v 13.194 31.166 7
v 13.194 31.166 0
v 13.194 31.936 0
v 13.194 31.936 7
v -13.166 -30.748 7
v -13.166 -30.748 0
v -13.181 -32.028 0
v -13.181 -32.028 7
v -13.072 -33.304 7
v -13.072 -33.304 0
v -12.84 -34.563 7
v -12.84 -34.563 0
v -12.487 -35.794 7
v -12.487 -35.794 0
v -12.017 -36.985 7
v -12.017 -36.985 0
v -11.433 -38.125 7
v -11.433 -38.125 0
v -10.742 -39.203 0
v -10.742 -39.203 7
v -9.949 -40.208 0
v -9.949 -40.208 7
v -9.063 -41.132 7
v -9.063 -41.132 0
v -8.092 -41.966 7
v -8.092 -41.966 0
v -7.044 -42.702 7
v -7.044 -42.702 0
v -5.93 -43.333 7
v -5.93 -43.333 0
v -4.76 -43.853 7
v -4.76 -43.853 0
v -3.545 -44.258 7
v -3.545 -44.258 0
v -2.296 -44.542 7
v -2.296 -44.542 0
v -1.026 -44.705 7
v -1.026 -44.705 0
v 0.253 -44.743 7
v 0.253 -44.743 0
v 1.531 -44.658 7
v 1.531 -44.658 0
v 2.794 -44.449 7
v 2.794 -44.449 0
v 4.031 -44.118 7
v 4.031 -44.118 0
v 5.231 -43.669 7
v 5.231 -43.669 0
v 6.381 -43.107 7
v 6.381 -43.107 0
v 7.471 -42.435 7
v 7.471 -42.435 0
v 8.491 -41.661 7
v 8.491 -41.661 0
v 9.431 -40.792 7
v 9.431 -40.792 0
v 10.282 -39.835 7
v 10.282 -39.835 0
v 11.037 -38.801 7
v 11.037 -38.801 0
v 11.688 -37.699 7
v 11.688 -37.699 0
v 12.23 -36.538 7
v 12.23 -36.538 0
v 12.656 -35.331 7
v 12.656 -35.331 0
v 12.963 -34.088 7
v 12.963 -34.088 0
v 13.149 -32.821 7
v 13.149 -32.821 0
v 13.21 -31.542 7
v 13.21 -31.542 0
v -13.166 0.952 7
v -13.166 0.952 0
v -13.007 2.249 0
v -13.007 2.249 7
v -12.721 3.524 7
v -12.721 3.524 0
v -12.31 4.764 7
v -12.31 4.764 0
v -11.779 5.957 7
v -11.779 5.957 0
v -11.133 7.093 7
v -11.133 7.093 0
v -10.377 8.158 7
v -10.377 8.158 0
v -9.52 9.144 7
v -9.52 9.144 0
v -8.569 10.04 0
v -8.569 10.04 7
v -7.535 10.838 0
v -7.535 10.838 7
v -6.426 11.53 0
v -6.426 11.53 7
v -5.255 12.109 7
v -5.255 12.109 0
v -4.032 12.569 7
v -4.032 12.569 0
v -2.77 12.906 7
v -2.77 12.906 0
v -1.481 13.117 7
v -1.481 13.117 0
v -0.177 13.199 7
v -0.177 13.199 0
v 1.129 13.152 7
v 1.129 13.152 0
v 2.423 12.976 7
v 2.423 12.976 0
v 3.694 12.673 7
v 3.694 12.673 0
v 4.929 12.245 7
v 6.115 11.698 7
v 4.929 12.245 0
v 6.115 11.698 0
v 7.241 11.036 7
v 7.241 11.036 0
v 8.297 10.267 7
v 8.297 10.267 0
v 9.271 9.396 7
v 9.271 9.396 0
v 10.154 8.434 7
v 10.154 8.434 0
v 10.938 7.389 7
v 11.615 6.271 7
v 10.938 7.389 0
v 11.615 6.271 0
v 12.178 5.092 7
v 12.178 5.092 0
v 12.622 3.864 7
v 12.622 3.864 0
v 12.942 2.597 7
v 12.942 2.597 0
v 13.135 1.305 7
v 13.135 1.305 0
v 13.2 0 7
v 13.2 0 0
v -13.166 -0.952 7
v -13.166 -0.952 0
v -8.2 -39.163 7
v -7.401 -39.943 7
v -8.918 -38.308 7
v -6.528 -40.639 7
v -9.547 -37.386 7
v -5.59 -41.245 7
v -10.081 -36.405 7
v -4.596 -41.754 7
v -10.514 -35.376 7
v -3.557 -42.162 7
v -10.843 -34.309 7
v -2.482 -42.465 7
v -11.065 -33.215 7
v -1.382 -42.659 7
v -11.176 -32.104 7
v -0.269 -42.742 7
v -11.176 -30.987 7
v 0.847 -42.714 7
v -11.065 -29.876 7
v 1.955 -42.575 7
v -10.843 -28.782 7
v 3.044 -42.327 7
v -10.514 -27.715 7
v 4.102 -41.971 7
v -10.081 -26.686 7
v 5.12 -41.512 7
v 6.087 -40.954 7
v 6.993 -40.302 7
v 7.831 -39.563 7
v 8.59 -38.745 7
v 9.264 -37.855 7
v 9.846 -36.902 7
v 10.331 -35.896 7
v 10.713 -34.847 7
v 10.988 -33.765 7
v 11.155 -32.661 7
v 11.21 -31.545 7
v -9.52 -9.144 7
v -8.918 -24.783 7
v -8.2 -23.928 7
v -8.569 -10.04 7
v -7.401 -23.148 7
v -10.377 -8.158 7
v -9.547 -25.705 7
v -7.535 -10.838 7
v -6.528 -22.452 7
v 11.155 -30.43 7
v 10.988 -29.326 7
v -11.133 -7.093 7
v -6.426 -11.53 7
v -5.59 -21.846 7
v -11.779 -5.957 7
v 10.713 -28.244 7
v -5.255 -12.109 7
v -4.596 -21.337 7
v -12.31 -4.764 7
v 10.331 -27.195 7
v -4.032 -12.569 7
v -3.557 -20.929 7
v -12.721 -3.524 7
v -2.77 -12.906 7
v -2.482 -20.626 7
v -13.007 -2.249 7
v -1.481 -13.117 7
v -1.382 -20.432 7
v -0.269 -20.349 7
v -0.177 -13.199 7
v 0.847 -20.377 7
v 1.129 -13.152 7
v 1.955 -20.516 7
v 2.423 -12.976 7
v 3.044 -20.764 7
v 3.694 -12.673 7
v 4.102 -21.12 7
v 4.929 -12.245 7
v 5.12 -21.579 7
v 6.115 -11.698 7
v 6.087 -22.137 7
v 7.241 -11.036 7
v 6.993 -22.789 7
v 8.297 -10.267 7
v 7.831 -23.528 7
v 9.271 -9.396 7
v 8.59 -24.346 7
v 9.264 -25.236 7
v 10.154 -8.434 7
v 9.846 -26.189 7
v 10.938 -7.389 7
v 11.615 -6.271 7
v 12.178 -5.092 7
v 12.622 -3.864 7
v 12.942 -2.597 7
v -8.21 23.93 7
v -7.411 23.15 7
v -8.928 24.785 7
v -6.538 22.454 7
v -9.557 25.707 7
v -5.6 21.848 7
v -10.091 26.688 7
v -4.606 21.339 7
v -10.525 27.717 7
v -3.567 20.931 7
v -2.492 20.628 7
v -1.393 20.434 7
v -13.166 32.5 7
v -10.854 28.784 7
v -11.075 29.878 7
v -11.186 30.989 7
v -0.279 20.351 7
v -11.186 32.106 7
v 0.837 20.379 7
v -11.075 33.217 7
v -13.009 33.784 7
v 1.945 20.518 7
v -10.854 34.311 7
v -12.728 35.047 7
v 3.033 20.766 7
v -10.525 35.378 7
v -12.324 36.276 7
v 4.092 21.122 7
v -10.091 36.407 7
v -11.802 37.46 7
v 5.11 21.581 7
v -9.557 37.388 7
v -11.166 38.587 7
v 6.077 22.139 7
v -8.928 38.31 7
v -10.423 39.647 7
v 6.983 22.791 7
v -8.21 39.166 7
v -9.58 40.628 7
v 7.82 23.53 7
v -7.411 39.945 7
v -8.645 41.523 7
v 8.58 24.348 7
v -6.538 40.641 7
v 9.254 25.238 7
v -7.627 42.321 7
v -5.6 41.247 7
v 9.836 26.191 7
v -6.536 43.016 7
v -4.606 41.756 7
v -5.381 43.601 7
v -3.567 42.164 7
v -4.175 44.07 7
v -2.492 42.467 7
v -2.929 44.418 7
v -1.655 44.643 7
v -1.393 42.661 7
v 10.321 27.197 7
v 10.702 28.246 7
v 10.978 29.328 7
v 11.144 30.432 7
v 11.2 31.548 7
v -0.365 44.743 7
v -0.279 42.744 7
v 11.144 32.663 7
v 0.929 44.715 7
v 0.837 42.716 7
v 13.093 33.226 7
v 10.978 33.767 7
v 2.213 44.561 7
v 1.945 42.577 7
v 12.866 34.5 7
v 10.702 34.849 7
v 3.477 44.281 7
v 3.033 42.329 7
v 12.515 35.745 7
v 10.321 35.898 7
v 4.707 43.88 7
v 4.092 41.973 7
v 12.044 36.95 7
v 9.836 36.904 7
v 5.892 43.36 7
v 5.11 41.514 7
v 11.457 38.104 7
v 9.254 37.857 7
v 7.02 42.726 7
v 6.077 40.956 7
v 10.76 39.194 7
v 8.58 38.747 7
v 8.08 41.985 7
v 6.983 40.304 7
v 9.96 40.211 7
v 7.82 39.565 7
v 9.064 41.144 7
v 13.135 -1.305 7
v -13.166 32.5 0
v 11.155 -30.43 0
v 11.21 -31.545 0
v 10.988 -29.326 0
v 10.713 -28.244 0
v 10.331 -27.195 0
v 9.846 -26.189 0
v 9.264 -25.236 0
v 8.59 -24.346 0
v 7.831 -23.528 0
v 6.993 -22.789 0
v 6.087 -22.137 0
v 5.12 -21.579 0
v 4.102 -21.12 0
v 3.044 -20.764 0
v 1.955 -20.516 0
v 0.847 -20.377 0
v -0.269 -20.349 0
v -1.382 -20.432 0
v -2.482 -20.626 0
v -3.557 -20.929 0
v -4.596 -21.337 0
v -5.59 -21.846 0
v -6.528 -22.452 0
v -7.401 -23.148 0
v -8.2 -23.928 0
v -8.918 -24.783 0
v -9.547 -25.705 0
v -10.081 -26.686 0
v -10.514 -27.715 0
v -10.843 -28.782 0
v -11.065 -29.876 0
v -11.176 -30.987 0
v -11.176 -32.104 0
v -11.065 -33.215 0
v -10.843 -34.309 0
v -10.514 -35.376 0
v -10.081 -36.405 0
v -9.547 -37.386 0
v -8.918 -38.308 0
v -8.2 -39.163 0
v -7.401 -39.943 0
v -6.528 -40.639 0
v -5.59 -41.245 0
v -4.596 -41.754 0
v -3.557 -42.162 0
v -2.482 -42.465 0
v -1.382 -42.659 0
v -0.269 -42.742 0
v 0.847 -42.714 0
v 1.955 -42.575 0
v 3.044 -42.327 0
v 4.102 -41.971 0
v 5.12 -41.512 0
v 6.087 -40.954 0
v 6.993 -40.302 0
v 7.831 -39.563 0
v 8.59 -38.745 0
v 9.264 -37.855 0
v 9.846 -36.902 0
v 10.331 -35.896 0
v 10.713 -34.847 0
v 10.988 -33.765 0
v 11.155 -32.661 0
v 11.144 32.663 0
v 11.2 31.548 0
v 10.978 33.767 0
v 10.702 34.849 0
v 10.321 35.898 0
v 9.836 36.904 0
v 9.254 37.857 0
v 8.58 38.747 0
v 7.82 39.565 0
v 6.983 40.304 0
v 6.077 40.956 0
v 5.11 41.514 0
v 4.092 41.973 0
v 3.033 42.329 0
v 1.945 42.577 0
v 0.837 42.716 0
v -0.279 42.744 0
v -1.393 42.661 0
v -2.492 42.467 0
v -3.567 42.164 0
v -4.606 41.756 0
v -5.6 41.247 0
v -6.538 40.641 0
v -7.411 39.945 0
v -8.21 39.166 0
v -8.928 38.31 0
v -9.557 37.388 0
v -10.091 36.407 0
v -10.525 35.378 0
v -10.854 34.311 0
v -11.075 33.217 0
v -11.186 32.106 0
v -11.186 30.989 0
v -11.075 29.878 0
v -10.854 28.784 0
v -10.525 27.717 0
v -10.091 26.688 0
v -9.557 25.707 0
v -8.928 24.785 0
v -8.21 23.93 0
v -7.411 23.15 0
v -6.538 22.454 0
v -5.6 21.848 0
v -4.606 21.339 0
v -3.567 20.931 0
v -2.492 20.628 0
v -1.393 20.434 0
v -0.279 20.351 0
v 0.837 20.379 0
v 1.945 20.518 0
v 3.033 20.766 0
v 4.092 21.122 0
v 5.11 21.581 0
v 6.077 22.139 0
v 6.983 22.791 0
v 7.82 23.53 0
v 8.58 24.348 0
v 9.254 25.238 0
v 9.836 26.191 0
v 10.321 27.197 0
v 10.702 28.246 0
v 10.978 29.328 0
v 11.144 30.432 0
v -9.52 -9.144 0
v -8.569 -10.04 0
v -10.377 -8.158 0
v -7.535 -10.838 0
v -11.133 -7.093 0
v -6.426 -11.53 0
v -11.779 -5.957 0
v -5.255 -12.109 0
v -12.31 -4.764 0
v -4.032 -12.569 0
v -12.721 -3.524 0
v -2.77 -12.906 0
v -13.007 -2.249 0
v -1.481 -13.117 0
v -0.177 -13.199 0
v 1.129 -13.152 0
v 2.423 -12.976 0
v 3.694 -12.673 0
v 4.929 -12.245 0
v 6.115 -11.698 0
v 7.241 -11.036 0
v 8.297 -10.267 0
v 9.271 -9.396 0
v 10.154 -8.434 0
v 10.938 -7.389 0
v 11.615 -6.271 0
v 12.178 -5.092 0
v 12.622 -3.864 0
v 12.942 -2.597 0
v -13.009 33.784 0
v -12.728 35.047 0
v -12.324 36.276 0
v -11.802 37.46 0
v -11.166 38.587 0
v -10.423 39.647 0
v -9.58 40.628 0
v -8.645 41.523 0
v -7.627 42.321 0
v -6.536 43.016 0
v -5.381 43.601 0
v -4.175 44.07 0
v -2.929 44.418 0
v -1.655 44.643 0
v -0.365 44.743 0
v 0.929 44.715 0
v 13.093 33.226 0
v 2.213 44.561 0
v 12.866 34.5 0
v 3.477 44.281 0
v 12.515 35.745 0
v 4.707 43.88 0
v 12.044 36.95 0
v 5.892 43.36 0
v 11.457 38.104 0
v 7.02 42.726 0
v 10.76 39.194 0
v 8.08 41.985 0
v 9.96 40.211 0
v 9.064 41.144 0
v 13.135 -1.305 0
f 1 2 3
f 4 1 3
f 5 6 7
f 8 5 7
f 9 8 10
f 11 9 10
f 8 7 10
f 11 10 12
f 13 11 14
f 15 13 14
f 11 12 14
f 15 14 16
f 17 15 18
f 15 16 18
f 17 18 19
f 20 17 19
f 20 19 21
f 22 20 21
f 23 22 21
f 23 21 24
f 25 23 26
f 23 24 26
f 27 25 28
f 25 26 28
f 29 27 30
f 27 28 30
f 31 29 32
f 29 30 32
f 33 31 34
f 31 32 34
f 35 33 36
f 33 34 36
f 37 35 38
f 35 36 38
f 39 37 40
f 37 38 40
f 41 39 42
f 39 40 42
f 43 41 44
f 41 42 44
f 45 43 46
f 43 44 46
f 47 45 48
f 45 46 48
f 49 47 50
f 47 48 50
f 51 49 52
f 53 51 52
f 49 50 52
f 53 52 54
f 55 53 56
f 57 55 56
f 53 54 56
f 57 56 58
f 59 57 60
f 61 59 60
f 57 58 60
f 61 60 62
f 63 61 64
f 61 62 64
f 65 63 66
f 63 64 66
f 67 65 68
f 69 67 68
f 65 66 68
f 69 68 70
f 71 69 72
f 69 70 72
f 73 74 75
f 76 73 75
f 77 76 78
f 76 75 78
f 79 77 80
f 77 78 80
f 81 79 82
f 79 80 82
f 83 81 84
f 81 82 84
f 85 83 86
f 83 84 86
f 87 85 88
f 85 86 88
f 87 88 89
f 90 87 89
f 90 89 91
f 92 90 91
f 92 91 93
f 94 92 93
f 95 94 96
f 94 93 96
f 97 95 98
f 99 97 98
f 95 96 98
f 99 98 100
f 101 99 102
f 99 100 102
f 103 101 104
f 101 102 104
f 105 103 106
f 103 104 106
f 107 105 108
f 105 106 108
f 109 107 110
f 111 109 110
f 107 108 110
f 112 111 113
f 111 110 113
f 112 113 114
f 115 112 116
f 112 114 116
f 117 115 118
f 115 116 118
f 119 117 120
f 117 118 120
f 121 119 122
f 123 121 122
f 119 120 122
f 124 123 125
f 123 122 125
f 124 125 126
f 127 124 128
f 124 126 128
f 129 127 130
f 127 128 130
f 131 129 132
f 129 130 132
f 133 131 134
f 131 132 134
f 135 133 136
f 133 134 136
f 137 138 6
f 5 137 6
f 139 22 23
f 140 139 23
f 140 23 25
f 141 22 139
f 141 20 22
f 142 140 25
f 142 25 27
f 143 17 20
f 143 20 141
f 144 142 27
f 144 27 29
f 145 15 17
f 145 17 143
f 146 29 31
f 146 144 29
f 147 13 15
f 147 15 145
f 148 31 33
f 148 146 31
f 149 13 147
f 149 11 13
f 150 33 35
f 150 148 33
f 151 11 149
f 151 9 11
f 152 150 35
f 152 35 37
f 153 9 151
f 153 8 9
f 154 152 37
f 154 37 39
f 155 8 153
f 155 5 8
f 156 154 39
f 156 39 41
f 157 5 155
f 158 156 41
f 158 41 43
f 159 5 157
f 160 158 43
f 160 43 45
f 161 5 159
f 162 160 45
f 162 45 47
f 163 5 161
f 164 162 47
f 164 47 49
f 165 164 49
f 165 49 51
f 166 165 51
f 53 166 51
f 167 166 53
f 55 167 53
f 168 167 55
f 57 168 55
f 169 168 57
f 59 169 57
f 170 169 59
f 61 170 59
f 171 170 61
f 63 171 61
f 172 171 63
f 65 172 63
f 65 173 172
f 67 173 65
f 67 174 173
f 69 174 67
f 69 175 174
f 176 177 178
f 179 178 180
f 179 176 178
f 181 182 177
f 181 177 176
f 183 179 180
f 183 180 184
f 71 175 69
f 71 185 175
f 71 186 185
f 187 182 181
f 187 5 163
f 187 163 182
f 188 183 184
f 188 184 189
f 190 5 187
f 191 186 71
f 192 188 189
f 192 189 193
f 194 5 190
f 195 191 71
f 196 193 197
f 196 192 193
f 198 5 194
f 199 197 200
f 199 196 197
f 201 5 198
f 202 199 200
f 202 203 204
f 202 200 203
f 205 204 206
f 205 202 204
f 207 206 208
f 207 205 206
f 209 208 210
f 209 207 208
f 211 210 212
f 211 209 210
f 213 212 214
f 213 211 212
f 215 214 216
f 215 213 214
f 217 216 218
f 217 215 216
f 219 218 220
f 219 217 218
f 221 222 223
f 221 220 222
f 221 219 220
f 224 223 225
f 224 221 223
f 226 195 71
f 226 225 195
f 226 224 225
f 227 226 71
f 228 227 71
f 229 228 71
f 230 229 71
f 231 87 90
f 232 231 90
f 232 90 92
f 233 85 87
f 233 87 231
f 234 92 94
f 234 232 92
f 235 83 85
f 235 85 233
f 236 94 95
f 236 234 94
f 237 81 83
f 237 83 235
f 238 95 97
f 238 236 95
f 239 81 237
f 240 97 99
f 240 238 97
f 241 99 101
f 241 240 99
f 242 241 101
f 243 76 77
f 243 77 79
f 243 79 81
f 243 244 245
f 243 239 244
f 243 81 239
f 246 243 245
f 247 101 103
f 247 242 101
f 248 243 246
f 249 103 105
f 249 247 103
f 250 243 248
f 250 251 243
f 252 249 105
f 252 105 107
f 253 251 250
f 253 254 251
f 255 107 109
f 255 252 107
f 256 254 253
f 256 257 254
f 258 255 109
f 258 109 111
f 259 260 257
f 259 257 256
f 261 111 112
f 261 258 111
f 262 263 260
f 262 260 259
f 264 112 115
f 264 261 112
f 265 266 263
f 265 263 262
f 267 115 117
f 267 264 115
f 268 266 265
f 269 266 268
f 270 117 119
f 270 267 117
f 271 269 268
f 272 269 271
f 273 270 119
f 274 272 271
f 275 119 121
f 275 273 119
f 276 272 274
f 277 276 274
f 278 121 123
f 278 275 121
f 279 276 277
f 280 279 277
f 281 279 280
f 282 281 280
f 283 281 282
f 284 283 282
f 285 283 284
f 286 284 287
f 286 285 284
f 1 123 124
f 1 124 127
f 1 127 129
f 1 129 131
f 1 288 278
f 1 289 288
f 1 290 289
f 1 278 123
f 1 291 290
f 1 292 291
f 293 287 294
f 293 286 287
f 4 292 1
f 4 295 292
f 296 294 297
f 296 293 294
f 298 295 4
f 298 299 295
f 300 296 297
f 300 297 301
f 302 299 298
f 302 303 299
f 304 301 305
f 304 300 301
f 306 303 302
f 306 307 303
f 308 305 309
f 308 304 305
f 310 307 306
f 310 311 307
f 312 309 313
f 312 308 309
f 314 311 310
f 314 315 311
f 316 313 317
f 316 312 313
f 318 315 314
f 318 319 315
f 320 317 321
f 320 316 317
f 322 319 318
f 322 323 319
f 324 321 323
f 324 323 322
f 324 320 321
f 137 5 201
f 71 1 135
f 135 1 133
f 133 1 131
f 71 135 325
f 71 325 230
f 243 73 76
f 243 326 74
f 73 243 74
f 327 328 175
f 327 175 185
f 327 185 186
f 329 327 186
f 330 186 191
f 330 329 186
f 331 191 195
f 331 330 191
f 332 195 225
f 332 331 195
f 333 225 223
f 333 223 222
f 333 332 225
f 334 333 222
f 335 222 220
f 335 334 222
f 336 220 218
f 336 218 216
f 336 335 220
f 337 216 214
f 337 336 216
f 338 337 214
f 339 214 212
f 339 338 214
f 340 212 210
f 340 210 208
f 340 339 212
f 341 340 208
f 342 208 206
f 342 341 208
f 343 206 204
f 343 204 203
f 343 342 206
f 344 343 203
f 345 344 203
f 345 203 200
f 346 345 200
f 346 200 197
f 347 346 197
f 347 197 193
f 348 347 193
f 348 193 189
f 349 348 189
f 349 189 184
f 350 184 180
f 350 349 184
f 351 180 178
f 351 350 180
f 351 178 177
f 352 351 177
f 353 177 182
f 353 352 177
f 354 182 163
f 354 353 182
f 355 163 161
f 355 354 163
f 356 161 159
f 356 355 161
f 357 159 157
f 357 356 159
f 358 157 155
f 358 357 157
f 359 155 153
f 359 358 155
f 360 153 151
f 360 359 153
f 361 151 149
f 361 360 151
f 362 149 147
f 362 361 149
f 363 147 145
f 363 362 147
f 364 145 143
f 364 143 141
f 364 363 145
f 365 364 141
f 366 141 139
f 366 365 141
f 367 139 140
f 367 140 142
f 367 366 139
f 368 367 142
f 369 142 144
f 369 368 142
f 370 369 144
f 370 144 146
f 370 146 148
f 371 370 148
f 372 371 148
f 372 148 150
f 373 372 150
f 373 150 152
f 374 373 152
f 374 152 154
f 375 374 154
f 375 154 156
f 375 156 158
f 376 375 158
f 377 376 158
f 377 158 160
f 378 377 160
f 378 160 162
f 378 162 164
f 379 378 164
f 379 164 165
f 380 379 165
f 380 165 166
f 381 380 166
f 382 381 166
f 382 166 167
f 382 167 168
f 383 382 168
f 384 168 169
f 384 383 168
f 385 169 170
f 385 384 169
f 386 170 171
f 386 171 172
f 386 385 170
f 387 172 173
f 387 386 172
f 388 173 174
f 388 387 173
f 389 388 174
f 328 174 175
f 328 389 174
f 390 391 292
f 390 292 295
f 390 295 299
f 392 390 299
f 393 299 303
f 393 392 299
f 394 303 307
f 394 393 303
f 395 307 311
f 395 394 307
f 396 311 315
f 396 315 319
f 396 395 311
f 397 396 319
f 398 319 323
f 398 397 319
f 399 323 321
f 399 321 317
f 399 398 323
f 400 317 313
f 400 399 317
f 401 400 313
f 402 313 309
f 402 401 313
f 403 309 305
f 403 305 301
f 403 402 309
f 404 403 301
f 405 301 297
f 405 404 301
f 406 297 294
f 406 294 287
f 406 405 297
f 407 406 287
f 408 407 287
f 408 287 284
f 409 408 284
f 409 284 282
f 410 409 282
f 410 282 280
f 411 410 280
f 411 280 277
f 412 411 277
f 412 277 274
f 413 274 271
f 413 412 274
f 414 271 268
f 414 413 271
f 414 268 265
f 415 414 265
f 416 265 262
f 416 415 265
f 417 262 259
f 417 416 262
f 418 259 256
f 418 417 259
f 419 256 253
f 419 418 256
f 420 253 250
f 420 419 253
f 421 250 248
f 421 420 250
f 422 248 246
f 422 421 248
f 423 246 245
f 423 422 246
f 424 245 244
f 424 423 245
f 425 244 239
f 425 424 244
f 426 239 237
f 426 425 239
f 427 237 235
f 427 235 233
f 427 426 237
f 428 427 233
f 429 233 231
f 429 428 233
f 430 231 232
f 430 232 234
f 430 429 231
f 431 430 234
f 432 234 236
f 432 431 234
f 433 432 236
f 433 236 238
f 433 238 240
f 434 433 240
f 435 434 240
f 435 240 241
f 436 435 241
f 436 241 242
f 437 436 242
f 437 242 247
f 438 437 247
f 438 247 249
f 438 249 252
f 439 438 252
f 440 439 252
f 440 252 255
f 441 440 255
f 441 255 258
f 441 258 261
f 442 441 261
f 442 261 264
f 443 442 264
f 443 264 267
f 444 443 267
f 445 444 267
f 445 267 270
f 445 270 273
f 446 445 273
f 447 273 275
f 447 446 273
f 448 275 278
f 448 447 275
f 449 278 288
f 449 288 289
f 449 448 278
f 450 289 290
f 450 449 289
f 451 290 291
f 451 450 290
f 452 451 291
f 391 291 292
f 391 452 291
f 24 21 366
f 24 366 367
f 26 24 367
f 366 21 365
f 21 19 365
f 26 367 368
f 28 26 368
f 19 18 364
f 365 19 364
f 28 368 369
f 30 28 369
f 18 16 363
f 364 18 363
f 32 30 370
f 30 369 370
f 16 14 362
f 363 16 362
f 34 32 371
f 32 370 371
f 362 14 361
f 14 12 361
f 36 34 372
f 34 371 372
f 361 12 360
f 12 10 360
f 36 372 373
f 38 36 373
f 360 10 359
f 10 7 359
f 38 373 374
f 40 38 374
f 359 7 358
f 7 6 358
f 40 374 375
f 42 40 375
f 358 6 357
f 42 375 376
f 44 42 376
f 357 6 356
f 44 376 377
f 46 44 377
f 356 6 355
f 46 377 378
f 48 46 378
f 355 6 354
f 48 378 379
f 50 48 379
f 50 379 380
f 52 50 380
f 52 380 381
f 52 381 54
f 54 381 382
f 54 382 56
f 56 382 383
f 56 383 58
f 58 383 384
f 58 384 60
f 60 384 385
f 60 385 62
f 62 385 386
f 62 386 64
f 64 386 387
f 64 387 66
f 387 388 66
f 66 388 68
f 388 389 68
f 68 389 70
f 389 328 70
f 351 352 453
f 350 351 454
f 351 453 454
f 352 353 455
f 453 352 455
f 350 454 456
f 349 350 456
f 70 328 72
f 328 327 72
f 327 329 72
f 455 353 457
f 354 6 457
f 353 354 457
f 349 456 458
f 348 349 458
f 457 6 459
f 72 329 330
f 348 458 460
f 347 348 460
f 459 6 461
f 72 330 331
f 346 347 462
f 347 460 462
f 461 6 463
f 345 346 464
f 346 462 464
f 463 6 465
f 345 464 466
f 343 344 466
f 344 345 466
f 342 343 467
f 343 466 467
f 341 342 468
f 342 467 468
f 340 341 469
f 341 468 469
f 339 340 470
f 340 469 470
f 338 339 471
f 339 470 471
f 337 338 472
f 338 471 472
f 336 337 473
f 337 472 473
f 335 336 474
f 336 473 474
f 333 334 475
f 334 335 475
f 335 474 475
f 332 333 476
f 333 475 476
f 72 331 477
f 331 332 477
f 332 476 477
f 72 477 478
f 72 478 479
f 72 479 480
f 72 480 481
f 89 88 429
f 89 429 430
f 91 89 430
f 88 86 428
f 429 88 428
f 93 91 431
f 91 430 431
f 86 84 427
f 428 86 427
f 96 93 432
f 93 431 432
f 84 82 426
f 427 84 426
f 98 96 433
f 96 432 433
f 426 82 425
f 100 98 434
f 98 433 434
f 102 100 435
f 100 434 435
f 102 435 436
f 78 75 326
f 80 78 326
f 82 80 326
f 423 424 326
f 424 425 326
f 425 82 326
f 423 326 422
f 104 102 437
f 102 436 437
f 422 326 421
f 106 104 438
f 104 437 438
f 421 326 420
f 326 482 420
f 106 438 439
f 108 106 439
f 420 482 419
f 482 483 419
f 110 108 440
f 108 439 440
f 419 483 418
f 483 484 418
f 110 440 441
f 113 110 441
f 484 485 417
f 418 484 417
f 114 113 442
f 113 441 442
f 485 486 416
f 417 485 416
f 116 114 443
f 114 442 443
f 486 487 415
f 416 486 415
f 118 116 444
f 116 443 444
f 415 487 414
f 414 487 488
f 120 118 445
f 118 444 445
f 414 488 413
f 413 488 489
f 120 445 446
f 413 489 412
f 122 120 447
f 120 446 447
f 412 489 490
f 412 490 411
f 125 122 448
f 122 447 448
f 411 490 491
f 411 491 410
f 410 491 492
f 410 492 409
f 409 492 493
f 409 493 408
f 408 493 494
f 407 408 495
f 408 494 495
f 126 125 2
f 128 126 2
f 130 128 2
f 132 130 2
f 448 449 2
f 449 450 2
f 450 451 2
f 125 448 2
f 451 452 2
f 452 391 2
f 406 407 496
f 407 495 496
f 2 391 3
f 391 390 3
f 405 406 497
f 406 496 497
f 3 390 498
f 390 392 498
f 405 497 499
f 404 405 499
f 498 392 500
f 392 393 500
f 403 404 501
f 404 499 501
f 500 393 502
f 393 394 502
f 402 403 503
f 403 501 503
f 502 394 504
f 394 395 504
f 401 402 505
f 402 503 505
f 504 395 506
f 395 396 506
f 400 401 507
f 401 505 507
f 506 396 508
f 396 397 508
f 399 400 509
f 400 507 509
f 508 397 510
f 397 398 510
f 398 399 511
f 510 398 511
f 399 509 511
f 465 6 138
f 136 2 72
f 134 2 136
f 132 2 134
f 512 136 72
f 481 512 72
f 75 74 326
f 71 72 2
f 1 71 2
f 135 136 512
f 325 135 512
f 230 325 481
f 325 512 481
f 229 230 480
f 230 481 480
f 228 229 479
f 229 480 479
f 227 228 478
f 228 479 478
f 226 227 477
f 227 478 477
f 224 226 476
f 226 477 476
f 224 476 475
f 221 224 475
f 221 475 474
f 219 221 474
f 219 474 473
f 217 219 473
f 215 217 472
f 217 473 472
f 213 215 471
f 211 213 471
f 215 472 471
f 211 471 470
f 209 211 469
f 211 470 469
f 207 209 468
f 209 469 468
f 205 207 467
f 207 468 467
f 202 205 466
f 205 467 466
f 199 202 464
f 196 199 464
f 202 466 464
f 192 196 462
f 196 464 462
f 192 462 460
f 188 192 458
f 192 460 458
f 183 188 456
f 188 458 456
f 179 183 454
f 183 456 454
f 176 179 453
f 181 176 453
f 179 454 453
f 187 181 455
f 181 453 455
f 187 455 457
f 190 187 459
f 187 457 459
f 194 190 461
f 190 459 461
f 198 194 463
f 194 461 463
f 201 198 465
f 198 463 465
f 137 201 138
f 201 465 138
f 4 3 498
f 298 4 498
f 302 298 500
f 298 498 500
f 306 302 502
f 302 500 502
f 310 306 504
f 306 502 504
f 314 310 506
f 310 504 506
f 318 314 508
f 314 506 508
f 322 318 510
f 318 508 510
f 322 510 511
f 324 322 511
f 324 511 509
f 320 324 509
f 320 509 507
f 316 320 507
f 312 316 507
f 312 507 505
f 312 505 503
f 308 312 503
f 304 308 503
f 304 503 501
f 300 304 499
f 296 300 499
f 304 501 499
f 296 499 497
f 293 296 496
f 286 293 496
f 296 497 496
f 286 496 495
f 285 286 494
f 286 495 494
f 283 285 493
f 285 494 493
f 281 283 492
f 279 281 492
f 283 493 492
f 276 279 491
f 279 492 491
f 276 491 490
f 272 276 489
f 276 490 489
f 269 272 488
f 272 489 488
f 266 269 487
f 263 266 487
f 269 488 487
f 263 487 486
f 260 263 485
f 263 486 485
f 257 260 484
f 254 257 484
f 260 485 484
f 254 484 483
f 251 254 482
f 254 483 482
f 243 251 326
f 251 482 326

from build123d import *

# Parameters (mm, degrees)
F0_R     = 11.2
F1_DEPTH = 7


with BuildPart() as f1:
    # F0 (on Top) → F1 (new body)
    with BuildSketch(Plane.XY):
        with BuildLine():
            ThreePointArc((-13.165616, 0.952129), (0.476375, 13.191401), (13.2, 0))
            ThreePointArc((13.2, 0), (0.476375, -13.191401), (-13.165616, -0.952129))
            Line((-13.165616, -0.952129), (-13.165616, -30.748123))
            ThreePointArc((-13.165616, -30.748123), (-0.386904, -44.739478), (13.21028, -31.542127))
            Line((13.21028, -31.542127), (13.194472, 31.165589))
            Line((13.194472, 31.165589), (13.194278, 31.936201))
            ThreePointArc((13.194278, 31.936201), (0.282113, 44.744554), (-13.165616, 32.499698))
            Line((-13.165616, 32.499698), (-13.165616, 30.59544))
            Line((-13.165616, 30.59544), (-13.165616, 0.952129))
        make_face()
        with Locations((0.010281, -31.545455)):
            Circle(F0_R, mode=Mode.SUBTRACT)
        with Locations((0, 31.547569)):
            Circle(F0_R, mode=Mode.SUBTRACT)
    extrude(amount=F1_DEPTH)


solid = f1.part
